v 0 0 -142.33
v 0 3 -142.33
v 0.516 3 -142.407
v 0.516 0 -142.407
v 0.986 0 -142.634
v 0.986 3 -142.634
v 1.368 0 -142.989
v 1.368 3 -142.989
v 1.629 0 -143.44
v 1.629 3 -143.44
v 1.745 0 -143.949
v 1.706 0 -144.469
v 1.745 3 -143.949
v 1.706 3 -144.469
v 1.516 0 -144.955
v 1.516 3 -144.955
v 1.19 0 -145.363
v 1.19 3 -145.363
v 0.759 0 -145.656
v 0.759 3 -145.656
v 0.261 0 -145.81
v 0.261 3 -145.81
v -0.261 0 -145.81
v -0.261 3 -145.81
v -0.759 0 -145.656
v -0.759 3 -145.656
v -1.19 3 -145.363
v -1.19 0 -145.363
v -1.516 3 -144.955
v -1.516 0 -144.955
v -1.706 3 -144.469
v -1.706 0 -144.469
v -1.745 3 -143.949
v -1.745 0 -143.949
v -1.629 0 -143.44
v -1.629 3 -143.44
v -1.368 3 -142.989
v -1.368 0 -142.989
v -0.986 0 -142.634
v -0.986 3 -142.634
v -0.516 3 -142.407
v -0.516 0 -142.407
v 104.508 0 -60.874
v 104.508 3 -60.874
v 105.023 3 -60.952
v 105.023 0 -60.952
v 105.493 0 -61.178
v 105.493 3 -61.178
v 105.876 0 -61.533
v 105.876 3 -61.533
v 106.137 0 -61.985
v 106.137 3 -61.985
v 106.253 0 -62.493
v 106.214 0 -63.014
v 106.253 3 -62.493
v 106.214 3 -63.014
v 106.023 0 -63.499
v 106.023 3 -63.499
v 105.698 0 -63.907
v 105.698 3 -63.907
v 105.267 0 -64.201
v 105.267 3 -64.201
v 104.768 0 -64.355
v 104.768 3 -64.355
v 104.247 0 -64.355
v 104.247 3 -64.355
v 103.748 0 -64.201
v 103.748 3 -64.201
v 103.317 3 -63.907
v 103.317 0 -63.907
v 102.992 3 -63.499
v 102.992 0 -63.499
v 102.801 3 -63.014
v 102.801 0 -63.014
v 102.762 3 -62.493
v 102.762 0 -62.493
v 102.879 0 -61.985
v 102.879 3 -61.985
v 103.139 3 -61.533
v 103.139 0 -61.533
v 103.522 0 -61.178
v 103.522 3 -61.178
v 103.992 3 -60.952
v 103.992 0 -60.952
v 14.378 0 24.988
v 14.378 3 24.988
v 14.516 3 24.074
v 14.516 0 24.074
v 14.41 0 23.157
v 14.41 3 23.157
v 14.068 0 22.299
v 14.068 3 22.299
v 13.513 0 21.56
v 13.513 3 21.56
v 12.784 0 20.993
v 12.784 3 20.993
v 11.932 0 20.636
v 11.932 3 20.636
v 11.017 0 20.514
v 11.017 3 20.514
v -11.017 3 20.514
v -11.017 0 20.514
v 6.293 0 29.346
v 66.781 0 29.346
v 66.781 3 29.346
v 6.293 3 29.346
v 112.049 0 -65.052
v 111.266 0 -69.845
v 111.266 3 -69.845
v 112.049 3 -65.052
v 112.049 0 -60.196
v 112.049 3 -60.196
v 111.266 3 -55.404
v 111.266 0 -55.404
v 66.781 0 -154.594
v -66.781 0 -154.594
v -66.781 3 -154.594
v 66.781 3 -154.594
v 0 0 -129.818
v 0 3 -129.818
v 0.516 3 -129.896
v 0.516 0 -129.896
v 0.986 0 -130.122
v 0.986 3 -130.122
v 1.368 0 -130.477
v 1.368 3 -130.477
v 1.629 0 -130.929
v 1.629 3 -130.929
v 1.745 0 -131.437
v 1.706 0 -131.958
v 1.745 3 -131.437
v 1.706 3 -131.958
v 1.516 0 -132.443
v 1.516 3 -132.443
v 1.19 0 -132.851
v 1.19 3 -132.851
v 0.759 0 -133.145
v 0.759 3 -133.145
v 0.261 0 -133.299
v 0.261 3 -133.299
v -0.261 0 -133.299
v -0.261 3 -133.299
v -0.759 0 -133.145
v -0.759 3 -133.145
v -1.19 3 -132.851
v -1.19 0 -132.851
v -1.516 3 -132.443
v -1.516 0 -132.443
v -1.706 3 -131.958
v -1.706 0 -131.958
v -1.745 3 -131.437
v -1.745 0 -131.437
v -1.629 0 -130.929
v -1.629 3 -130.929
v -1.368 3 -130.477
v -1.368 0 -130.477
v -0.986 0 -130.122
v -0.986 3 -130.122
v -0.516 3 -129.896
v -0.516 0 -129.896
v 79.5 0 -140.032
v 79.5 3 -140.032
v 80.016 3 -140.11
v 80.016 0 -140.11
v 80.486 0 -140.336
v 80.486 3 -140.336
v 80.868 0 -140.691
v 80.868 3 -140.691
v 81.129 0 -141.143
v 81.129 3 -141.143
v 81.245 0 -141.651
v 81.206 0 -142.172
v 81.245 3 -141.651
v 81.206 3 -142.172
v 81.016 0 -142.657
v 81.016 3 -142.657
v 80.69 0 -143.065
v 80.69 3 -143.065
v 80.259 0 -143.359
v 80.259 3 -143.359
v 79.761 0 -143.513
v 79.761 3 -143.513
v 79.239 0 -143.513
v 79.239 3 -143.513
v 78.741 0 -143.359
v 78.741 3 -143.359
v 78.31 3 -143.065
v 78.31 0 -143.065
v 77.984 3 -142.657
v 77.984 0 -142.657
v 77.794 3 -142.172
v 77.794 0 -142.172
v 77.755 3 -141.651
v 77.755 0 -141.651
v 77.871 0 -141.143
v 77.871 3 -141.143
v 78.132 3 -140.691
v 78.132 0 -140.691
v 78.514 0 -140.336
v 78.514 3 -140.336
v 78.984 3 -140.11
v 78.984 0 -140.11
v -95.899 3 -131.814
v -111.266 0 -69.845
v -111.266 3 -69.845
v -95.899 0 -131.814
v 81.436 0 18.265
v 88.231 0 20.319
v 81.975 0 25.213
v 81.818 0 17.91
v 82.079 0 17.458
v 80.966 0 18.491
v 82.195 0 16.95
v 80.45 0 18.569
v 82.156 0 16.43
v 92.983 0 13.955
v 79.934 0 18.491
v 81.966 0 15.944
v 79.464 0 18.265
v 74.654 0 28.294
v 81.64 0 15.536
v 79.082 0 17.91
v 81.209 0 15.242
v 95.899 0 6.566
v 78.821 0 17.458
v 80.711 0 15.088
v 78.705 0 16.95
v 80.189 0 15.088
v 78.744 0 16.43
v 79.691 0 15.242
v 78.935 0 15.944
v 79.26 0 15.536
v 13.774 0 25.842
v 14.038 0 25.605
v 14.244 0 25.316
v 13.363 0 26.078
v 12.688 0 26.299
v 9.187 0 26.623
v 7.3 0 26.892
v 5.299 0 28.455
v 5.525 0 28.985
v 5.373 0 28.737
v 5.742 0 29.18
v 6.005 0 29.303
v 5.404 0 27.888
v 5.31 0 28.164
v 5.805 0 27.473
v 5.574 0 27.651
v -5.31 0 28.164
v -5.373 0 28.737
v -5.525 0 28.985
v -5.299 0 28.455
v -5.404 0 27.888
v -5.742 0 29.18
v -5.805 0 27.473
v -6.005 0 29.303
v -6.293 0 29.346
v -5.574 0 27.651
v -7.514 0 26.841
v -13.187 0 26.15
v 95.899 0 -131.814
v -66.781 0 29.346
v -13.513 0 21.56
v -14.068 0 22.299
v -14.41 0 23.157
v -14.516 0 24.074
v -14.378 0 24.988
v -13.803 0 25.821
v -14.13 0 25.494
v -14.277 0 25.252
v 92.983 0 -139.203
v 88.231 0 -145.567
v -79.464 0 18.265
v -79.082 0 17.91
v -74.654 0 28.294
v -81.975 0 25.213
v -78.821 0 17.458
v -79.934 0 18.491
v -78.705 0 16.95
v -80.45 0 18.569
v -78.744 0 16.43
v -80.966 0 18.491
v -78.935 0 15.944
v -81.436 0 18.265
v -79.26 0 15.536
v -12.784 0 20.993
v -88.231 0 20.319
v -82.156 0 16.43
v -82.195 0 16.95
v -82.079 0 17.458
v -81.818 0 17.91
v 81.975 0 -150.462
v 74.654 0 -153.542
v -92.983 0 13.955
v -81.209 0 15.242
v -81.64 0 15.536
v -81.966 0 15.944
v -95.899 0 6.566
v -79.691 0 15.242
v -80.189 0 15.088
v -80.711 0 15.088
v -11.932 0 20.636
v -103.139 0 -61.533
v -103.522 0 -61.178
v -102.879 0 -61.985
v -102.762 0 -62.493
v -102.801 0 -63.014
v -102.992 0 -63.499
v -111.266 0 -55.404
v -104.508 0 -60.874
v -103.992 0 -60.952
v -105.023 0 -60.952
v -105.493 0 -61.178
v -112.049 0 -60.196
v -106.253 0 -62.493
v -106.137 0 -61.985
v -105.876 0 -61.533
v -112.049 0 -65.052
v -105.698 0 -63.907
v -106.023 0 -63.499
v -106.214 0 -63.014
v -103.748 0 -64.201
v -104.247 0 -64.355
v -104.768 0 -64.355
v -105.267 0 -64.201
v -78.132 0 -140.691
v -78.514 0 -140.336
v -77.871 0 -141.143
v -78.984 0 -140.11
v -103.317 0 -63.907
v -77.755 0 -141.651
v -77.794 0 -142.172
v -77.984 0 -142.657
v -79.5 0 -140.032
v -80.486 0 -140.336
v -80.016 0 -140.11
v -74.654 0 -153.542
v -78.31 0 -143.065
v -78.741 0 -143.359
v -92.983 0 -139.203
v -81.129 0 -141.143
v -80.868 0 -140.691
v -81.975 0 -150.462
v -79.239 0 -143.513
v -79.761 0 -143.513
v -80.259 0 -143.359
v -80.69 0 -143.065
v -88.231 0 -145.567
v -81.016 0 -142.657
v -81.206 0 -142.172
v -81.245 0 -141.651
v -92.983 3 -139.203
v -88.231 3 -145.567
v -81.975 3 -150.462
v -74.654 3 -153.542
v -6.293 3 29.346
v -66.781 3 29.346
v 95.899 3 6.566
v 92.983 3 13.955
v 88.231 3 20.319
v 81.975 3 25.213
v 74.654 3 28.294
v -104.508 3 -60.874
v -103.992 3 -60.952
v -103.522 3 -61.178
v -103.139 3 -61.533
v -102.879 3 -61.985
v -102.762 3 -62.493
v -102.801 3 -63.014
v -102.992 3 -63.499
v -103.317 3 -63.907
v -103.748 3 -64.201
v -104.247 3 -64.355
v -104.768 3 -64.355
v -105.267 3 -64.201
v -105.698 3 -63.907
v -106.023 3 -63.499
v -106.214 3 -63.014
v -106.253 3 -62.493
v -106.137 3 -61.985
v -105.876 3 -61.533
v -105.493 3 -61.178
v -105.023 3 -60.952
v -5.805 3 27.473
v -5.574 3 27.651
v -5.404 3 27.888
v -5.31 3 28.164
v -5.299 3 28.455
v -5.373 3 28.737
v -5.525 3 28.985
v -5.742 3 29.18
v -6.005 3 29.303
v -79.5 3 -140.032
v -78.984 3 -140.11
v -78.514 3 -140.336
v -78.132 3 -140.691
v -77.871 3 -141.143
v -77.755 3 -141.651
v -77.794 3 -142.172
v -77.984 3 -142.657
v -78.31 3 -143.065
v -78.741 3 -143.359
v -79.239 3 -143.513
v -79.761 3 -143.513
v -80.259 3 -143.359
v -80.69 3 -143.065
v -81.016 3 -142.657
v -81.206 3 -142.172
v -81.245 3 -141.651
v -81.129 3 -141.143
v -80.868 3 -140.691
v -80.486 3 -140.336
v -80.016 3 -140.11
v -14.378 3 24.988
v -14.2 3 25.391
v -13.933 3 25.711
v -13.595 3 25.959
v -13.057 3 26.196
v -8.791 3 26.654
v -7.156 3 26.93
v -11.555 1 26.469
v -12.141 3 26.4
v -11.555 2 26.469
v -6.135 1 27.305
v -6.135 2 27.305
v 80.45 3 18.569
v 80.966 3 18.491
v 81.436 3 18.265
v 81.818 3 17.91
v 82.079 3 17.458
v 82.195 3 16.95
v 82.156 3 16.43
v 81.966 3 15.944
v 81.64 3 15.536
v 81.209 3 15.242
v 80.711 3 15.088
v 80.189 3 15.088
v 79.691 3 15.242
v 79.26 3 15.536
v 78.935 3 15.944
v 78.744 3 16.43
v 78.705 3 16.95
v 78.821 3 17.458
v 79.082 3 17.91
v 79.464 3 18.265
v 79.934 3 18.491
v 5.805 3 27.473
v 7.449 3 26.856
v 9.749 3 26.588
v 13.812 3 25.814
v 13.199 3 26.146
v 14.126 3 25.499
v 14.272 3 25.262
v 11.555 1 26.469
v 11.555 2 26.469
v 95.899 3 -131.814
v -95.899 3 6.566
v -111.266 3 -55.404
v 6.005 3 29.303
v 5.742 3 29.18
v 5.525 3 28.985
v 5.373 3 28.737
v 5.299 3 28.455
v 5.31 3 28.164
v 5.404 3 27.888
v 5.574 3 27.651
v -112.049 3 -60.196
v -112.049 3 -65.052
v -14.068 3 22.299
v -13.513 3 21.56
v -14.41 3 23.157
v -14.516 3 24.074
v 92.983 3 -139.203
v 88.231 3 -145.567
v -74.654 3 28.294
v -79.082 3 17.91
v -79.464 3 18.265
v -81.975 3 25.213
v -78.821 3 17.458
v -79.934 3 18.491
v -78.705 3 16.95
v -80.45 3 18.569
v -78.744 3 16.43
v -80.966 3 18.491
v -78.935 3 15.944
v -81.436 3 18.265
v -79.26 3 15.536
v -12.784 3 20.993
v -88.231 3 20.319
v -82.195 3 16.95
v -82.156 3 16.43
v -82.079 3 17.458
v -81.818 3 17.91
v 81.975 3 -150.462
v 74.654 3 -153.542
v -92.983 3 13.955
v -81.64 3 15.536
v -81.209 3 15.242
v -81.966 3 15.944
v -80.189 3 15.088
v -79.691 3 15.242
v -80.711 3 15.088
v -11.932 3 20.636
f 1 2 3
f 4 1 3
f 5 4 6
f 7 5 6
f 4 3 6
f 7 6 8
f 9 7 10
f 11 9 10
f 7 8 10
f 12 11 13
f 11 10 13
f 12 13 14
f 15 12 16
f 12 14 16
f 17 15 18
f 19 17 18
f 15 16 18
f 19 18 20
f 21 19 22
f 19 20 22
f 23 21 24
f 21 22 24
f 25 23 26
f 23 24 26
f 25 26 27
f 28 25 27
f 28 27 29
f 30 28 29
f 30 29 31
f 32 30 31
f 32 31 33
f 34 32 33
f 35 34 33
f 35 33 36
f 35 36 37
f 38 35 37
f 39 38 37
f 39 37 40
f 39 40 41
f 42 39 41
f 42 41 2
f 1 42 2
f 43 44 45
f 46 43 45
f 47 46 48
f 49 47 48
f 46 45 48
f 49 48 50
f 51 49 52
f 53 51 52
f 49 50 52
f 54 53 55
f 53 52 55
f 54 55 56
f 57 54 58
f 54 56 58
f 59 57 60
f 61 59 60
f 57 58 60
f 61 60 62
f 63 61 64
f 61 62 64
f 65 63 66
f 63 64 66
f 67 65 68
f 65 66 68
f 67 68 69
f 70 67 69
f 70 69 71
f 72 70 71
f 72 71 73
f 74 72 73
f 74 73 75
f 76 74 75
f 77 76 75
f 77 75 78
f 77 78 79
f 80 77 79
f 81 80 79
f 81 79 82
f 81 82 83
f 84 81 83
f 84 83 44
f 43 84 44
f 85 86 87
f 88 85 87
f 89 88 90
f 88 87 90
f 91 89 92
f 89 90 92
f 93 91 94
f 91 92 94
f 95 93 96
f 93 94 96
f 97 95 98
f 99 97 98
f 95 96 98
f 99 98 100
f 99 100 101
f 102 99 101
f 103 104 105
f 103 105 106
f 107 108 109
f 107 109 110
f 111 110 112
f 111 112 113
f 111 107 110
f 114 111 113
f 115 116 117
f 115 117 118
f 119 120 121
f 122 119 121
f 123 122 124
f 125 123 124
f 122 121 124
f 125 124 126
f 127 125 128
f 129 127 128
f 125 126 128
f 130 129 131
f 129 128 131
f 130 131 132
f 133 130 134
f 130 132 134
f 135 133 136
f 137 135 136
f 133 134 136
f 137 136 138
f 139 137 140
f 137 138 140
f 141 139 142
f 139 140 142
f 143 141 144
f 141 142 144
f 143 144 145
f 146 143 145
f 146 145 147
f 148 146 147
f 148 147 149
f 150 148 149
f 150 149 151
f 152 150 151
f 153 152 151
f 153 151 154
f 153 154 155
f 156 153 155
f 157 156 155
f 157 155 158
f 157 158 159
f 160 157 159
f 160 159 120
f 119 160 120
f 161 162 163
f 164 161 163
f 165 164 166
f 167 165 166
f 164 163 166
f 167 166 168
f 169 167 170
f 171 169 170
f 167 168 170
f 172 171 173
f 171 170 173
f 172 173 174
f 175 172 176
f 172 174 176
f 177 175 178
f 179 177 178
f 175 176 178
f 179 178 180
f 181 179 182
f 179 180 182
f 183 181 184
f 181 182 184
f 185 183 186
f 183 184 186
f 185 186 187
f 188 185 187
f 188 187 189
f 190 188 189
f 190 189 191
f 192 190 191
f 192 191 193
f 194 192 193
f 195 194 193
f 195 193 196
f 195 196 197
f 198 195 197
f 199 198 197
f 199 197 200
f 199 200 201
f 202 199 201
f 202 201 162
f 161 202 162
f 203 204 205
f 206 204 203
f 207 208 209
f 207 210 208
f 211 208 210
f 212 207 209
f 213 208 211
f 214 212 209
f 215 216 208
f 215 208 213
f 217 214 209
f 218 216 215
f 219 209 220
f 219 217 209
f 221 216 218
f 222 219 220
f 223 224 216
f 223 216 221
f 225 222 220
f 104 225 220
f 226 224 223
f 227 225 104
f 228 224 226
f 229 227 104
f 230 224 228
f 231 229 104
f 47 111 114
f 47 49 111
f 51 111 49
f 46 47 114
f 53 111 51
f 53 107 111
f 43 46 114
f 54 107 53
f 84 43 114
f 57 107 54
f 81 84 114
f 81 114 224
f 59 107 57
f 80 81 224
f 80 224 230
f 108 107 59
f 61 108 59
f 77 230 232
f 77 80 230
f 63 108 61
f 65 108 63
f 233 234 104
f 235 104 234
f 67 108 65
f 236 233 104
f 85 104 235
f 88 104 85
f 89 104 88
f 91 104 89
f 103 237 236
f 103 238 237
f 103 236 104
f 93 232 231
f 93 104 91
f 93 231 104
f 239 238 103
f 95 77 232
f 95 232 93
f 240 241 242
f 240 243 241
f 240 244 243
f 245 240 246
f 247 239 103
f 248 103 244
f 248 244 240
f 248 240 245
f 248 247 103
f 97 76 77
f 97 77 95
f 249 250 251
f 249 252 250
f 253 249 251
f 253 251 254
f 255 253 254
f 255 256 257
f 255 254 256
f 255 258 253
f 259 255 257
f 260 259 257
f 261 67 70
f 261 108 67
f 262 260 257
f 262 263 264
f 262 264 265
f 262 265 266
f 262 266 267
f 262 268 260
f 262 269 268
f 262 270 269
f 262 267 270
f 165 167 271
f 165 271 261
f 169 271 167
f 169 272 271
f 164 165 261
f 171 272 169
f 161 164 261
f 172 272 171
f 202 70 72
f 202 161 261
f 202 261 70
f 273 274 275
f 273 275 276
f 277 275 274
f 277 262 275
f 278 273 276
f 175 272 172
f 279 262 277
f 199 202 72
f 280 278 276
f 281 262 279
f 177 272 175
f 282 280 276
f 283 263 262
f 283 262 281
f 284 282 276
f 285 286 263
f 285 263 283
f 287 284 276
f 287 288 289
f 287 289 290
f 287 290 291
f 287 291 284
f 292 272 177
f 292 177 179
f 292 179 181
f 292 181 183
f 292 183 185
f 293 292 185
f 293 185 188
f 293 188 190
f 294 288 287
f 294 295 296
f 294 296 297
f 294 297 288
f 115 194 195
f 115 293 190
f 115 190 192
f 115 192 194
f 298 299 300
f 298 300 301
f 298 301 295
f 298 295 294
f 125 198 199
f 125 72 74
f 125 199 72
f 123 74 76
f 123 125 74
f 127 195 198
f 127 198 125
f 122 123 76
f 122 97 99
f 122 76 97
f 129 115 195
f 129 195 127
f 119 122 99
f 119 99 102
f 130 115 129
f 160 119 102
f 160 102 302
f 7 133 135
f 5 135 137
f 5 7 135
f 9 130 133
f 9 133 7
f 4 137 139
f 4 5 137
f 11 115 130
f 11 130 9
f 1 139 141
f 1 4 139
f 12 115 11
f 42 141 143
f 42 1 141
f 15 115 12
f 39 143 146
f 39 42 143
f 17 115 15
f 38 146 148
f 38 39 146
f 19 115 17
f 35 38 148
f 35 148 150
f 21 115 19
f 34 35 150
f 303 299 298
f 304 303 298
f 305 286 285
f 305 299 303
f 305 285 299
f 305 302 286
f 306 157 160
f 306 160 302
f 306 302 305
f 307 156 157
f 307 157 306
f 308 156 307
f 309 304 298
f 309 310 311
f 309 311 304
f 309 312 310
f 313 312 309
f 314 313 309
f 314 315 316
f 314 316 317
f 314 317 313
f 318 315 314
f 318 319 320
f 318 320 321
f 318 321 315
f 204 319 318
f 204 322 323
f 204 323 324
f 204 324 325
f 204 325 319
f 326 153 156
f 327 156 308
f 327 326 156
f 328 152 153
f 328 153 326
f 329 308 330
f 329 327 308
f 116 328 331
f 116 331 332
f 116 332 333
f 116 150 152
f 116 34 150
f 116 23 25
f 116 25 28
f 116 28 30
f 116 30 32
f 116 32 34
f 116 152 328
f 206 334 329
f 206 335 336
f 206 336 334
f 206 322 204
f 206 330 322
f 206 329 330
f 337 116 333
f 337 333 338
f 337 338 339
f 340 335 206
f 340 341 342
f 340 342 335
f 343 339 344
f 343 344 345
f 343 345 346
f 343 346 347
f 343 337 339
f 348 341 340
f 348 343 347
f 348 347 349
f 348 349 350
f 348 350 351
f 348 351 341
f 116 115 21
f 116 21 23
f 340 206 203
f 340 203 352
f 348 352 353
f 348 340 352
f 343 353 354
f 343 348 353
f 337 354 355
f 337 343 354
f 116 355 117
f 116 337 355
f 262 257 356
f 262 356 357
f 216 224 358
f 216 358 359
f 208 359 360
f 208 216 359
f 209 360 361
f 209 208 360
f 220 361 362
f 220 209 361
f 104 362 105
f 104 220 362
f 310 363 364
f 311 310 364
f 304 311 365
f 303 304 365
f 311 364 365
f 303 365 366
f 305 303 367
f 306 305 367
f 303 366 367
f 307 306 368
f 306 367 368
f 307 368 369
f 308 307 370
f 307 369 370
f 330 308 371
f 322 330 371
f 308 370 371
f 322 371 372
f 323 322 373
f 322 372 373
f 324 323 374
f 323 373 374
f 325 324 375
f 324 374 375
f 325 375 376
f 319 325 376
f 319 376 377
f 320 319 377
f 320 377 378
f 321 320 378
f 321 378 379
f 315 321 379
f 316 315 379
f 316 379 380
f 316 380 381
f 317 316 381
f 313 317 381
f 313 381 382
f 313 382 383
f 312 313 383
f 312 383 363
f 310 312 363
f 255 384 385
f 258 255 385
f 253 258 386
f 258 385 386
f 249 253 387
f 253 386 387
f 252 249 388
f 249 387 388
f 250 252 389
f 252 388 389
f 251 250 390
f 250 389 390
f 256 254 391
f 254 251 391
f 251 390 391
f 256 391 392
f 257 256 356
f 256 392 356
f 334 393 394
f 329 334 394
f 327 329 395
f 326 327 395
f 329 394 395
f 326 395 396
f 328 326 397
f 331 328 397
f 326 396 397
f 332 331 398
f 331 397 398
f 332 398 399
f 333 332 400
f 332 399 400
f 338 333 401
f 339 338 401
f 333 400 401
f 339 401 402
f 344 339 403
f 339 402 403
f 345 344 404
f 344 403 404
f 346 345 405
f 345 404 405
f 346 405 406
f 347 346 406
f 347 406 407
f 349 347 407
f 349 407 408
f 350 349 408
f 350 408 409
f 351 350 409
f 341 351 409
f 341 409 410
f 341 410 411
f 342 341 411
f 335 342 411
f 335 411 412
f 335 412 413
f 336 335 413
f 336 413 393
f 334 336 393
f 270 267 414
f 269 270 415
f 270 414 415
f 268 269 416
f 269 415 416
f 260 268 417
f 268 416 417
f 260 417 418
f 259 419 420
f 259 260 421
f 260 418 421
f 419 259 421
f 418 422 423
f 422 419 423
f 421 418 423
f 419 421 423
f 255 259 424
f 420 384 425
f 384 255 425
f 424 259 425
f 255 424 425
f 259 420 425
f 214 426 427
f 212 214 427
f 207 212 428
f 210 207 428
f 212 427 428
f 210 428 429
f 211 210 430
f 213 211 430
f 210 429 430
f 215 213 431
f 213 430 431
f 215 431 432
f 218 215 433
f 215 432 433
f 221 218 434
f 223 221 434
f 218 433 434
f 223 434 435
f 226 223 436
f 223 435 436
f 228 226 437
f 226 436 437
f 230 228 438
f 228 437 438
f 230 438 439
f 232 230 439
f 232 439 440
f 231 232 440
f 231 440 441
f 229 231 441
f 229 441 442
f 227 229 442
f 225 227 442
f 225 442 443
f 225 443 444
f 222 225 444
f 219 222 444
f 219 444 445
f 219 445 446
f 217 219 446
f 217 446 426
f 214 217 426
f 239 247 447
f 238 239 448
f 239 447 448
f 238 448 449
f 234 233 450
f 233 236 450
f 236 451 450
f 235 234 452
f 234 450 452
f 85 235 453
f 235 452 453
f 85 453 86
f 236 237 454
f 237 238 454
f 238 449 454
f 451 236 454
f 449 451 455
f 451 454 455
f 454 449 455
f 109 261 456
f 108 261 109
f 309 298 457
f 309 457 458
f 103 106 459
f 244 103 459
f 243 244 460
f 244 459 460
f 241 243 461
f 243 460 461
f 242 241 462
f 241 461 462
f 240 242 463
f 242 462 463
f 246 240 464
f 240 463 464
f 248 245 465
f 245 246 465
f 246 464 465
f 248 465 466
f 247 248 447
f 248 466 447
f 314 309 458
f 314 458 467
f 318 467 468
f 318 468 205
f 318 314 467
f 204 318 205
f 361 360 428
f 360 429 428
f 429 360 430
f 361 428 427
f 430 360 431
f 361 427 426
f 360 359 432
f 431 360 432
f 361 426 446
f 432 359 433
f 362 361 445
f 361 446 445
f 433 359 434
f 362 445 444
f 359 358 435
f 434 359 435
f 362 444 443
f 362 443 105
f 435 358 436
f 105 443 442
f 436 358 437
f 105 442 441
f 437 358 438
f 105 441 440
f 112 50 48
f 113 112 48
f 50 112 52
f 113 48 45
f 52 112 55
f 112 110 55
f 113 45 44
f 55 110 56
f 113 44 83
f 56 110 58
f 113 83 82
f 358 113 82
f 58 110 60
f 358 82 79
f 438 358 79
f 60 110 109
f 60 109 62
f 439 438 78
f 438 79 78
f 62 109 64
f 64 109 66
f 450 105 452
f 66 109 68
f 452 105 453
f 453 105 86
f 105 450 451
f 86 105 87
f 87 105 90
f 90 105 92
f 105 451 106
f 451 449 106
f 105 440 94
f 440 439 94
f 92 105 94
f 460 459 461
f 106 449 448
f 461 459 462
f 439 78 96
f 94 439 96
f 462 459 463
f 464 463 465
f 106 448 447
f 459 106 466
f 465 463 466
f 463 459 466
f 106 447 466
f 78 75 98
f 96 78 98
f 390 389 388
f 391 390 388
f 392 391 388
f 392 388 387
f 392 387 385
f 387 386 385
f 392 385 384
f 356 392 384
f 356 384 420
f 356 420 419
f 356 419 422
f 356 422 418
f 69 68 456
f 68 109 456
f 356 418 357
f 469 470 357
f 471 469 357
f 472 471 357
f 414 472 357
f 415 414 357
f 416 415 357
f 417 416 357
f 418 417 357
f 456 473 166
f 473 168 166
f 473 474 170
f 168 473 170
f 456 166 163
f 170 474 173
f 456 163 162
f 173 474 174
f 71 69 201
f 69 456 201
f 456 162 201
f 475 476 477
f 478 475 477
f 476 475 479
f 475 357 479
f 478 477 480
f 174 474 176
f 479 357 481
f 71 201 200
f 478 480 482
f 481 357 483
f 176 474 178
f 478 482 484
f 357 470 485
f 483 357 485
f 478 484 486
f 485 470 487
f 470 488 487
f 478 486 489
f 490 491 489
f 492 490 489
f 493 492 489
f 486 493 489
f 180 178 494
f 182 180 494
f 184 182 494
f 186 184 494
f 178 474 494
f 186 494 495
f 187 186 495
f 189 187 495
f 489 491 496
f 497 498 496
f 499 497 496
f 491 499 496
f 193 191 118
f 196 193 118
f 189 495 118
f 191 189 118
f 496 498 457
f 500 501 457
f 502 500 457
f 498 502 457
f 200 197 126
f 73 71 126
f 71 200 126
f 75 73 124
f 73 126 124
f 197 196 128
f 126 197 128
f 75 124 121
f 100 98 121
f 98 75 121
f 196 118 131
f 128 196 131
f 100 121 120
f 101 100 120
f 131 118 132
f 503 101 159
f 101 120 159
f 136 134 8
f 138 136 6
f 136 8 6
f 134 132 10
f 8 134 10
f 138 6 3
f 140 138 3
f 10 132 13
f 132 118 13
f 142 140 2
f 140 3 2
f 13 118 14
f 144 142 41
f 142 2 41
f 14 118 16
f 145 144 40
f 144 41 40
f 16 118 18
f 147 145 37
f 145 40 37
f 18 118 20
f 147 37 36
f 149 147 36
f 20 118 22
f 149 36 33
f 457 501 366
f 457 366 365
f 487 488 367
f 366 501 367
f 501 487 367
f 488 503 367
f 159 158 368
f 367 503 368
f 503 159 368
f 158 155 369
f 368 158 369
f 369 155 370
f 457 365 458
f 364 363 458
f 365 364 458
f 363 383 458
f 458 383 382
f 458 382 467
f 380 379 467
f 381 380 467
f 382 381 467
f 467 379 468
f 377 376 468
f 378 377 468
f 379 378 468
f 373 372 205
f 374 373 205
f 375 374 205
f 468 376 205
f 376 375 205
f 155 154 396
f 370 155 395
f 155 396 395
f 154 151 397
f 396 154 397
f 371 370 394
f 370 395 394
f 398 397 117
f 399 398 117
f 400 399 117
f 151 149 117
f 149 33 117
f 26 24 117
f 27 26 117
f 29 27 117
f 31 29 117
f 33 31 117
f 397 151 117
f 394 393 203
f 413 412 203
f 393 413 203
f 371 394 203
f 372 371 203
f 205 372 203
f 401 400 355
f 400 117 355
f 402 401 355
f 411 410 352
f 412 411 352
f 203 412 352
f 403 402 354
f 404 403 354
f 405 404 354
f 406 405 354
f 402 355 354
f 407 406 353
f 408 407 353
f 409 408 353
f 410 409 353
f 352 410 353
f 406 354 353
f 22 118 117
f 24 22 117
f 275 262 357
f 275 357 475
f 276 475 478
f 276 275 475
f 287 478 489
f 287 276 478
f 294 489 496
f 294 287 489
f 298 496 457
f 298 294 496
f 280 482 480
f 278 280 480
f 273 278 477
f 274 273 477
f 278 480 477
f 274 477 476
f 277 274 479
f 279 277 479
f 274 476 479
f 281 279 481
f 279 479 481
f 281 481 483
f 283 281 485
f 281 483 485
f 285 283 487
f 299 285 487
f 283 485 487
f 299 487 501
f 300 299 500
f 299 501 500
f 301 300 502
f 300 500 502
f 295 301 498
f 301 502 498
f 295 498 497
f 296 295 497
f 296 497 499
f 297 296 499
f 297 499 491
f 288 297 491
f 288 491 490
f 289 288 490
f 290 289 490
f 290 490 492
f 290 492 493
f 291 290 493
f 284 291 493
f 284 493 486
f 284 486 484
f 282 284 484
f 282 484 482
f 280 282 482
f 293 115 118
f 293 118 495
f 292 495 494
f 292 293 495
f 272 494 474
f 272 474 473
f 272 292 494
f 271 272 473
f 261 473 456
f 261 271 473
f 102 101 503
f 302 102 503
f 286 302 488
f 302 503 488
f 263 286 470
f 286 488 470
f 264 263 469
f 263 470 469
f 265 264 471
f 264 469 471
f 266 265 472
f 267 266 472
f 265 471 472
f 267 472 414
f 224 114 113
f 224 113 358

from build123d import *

# Parameters (mm, degrees)
EXTRUDE_1_DEPTH     = 3
SKETCH_2_R          = 1.75
CUT_EXTRUDE_1_DEPTH = 10
SKETCH_3_R          = 1.75
CUT_EXTRUDE_2_DEPTH = 10
SKETCH_4_R          = 1.75
CUT_EXTRUDE_3_DEPTH = 10
CUT_EXTRUDE_4_DEPTH = 10


with BuildPart() as part:
    # 草图1 → 凸台-拉伸1 (new body)
    with BuildSketch(Plane(origin=(0, 0, 0), x_dir=(1, 0, 0), z_dir=(0, 1, 0))):
        with BuildLine():
            Line((-66.78059141, 154.593992167), (66.78059141, 154.593992167))
            ThreePointArc((66.78059141, 154.593992167), (85.265515034, 148.222525736), (95.898700635, 131.814498742))
            Line((95.898700635, 131.814498742), (111.265547961, 69.844672358))
            ThreePointArc((111.265547961, 69.844672358), (112.147438737, 62.624165782), (111.265547961, 55.403659207))
            Line((111.265547961, 55.403659207), (95.898700635, -6.566167178))
            ThreePointArc((95.898700635, -6.566167178), (85.265515034, -22.974194171), (66.78059141, -29.345660602))
            Line((66.78059141, -29.345660602), (-66.78059141, -29.345660602))
            ThreePointArc((-66.78059141, -29.345660602), (-85.265515034, -22.974194171), (-95.898700635, -6.566167178))
            Line((-95.898700635, -6.566167178), (-111.265547961, 55.403659207))
            ThreePointArc((-111.265547961, 55.403659207), (-112.147438737, 62.624165782), (-111.265547961, 69.844672358))
            Line((-111.265547961, 69.844672358), (-95.898700635, 131.814498742))
            ThreePointArc((-95.898700635, 131.814498742), (-85.265515034, 148.222525736), (-66.78059141, 154.593992167))
        make_face()
    extrude(amount=EXTRUDE_1_DEPTH)

    # 草图2 → 切除-拉伸1 (cut)
    with BuildSketch(Plane(origin=(0, 3, 0), x_dir=(1, 0, 0), z_dir=(0, 1, 0))):
        with Locations(Location((-104.507530951, 62.624165782, 0), (0, 0, 270))):
            Circle(SKETCH_2_R)
        with Locations(Location((-80.450184708, -16.818951307, 0), (0, 0, 270))):
            Circle(SKETCH_2_R)
        with Locations(Location((104.507530951, 62.624165782, 0), (0, 0, 270))):
            Circle(SKETCH_2_R)
        with Locations(Location((80.450184708, -16.818951307, 0), (0, 0, 270))):
            Circle(SKETCH_2_R)
    extrude(amount=-CUT_EXTRUDE_1_DEPTH, mode=Mode.SUBTRACT)

    # 草图3 → 切除-拉伸2 (cut)
    with BuildSketch(Plane(origin=(0, 3, 0), x_dir=(1, 0, 0), z_dir=(0, 1, 0))):
        with Locations(Location((0, 131.568155221, 0), (0, 0, 270))):
            Circle(SKETCH_3_R)
        with Locations(Location((0, 144.079729864, 0), (0, 0, 270))):
            Circle(SKETCH_3_R)
    extrude(amount=-CUT_EXTRUDE_2_DEPTH, mode=Mode.SUBTRACT)

    # 草图4 → 切除-拉伸3 (cut)
    with BuildSketch(Plane(origin=(0, 3, 0), x_dir=(1, 0, 0), z_dir=(0, 1, 0))):
        with Locations(Location((-79.5, 141.78226533, 0), (0, 0, 270))):
            Circle(SKETCH_4_R)
        with Locations(Location((79.5, 141.78226533, 0), (0, 0, 270))):
            Circle(SKETCH_4_R)
    extrude(amount=-CUT_EXTRUDE_3_DEPTH, mode=Mode.SUBTRACT)

    # 草图5 → 切除-拉伸4 (cut)
    with BuildSketch(Plane(origin=(0, 3, 0), x_dir=(1, 0, 0), z_dir=(0, 1, 0))):
        with BuildLine():
            Line((11.016648097, -20.513898252), (-11.016648097, -20.513898252))
            ThreePointArc((-11.016648097, -20.513898252), (-13.814702514, -21.911306641), (-14.378457093, -24.987674549))
            add(Edge.make_bspline(
                [(-14.378457093, -24.987674549), (-14.050661547, -26.11933694), (-10.489346867, -26.76009099), (-7.724749574, -26.493757466), (-5.904508816, -27.417302496), (-5.804576355, -27.473305111)],
                knots=[0, 0, 0, 0, 0.274123853, 0.745489655, 0.777393608, 0.777393608, 0.777393608, 0.777393608], degree=3))
            ThreePointArc((-5.804576355, -27.473305111), (-5.325885634, -28.59829127), (-6.293448421, -29.345660602))
            Line((-6.293448421, -29.345660602), (6.293448421, -29.345660602))
            ThreePointArc((6.293448421, -29.345660602), (5.325885634, -28.59829127), (5.804576355, -27.473305111))
            add(Edge.make_bspline(
                [(5.804576355, -27.473305111), (5.904508816, -27.417302496), (7.724749574, -26.493757466), (10.489346867, -26.76009099), (14.050661547, -26.11933694), (14.378457093, -24.987674549)],
                knots=[0, 0, 0, 0, 0.031903952, 0.503269754, 0.777393608, 0.777393608, 0.777393608, 0.777393608], degree=3))
            ThreePointArc((14.378457093, -24.987674549), (13.814702514, -21.911306641), (11.016648097, -20.513898252))
        make_face()
    extrude(amount=-CUT_EXTRUDE_4_DEPTH, mode=Mode.SUBTRACT)


solid = part.part
